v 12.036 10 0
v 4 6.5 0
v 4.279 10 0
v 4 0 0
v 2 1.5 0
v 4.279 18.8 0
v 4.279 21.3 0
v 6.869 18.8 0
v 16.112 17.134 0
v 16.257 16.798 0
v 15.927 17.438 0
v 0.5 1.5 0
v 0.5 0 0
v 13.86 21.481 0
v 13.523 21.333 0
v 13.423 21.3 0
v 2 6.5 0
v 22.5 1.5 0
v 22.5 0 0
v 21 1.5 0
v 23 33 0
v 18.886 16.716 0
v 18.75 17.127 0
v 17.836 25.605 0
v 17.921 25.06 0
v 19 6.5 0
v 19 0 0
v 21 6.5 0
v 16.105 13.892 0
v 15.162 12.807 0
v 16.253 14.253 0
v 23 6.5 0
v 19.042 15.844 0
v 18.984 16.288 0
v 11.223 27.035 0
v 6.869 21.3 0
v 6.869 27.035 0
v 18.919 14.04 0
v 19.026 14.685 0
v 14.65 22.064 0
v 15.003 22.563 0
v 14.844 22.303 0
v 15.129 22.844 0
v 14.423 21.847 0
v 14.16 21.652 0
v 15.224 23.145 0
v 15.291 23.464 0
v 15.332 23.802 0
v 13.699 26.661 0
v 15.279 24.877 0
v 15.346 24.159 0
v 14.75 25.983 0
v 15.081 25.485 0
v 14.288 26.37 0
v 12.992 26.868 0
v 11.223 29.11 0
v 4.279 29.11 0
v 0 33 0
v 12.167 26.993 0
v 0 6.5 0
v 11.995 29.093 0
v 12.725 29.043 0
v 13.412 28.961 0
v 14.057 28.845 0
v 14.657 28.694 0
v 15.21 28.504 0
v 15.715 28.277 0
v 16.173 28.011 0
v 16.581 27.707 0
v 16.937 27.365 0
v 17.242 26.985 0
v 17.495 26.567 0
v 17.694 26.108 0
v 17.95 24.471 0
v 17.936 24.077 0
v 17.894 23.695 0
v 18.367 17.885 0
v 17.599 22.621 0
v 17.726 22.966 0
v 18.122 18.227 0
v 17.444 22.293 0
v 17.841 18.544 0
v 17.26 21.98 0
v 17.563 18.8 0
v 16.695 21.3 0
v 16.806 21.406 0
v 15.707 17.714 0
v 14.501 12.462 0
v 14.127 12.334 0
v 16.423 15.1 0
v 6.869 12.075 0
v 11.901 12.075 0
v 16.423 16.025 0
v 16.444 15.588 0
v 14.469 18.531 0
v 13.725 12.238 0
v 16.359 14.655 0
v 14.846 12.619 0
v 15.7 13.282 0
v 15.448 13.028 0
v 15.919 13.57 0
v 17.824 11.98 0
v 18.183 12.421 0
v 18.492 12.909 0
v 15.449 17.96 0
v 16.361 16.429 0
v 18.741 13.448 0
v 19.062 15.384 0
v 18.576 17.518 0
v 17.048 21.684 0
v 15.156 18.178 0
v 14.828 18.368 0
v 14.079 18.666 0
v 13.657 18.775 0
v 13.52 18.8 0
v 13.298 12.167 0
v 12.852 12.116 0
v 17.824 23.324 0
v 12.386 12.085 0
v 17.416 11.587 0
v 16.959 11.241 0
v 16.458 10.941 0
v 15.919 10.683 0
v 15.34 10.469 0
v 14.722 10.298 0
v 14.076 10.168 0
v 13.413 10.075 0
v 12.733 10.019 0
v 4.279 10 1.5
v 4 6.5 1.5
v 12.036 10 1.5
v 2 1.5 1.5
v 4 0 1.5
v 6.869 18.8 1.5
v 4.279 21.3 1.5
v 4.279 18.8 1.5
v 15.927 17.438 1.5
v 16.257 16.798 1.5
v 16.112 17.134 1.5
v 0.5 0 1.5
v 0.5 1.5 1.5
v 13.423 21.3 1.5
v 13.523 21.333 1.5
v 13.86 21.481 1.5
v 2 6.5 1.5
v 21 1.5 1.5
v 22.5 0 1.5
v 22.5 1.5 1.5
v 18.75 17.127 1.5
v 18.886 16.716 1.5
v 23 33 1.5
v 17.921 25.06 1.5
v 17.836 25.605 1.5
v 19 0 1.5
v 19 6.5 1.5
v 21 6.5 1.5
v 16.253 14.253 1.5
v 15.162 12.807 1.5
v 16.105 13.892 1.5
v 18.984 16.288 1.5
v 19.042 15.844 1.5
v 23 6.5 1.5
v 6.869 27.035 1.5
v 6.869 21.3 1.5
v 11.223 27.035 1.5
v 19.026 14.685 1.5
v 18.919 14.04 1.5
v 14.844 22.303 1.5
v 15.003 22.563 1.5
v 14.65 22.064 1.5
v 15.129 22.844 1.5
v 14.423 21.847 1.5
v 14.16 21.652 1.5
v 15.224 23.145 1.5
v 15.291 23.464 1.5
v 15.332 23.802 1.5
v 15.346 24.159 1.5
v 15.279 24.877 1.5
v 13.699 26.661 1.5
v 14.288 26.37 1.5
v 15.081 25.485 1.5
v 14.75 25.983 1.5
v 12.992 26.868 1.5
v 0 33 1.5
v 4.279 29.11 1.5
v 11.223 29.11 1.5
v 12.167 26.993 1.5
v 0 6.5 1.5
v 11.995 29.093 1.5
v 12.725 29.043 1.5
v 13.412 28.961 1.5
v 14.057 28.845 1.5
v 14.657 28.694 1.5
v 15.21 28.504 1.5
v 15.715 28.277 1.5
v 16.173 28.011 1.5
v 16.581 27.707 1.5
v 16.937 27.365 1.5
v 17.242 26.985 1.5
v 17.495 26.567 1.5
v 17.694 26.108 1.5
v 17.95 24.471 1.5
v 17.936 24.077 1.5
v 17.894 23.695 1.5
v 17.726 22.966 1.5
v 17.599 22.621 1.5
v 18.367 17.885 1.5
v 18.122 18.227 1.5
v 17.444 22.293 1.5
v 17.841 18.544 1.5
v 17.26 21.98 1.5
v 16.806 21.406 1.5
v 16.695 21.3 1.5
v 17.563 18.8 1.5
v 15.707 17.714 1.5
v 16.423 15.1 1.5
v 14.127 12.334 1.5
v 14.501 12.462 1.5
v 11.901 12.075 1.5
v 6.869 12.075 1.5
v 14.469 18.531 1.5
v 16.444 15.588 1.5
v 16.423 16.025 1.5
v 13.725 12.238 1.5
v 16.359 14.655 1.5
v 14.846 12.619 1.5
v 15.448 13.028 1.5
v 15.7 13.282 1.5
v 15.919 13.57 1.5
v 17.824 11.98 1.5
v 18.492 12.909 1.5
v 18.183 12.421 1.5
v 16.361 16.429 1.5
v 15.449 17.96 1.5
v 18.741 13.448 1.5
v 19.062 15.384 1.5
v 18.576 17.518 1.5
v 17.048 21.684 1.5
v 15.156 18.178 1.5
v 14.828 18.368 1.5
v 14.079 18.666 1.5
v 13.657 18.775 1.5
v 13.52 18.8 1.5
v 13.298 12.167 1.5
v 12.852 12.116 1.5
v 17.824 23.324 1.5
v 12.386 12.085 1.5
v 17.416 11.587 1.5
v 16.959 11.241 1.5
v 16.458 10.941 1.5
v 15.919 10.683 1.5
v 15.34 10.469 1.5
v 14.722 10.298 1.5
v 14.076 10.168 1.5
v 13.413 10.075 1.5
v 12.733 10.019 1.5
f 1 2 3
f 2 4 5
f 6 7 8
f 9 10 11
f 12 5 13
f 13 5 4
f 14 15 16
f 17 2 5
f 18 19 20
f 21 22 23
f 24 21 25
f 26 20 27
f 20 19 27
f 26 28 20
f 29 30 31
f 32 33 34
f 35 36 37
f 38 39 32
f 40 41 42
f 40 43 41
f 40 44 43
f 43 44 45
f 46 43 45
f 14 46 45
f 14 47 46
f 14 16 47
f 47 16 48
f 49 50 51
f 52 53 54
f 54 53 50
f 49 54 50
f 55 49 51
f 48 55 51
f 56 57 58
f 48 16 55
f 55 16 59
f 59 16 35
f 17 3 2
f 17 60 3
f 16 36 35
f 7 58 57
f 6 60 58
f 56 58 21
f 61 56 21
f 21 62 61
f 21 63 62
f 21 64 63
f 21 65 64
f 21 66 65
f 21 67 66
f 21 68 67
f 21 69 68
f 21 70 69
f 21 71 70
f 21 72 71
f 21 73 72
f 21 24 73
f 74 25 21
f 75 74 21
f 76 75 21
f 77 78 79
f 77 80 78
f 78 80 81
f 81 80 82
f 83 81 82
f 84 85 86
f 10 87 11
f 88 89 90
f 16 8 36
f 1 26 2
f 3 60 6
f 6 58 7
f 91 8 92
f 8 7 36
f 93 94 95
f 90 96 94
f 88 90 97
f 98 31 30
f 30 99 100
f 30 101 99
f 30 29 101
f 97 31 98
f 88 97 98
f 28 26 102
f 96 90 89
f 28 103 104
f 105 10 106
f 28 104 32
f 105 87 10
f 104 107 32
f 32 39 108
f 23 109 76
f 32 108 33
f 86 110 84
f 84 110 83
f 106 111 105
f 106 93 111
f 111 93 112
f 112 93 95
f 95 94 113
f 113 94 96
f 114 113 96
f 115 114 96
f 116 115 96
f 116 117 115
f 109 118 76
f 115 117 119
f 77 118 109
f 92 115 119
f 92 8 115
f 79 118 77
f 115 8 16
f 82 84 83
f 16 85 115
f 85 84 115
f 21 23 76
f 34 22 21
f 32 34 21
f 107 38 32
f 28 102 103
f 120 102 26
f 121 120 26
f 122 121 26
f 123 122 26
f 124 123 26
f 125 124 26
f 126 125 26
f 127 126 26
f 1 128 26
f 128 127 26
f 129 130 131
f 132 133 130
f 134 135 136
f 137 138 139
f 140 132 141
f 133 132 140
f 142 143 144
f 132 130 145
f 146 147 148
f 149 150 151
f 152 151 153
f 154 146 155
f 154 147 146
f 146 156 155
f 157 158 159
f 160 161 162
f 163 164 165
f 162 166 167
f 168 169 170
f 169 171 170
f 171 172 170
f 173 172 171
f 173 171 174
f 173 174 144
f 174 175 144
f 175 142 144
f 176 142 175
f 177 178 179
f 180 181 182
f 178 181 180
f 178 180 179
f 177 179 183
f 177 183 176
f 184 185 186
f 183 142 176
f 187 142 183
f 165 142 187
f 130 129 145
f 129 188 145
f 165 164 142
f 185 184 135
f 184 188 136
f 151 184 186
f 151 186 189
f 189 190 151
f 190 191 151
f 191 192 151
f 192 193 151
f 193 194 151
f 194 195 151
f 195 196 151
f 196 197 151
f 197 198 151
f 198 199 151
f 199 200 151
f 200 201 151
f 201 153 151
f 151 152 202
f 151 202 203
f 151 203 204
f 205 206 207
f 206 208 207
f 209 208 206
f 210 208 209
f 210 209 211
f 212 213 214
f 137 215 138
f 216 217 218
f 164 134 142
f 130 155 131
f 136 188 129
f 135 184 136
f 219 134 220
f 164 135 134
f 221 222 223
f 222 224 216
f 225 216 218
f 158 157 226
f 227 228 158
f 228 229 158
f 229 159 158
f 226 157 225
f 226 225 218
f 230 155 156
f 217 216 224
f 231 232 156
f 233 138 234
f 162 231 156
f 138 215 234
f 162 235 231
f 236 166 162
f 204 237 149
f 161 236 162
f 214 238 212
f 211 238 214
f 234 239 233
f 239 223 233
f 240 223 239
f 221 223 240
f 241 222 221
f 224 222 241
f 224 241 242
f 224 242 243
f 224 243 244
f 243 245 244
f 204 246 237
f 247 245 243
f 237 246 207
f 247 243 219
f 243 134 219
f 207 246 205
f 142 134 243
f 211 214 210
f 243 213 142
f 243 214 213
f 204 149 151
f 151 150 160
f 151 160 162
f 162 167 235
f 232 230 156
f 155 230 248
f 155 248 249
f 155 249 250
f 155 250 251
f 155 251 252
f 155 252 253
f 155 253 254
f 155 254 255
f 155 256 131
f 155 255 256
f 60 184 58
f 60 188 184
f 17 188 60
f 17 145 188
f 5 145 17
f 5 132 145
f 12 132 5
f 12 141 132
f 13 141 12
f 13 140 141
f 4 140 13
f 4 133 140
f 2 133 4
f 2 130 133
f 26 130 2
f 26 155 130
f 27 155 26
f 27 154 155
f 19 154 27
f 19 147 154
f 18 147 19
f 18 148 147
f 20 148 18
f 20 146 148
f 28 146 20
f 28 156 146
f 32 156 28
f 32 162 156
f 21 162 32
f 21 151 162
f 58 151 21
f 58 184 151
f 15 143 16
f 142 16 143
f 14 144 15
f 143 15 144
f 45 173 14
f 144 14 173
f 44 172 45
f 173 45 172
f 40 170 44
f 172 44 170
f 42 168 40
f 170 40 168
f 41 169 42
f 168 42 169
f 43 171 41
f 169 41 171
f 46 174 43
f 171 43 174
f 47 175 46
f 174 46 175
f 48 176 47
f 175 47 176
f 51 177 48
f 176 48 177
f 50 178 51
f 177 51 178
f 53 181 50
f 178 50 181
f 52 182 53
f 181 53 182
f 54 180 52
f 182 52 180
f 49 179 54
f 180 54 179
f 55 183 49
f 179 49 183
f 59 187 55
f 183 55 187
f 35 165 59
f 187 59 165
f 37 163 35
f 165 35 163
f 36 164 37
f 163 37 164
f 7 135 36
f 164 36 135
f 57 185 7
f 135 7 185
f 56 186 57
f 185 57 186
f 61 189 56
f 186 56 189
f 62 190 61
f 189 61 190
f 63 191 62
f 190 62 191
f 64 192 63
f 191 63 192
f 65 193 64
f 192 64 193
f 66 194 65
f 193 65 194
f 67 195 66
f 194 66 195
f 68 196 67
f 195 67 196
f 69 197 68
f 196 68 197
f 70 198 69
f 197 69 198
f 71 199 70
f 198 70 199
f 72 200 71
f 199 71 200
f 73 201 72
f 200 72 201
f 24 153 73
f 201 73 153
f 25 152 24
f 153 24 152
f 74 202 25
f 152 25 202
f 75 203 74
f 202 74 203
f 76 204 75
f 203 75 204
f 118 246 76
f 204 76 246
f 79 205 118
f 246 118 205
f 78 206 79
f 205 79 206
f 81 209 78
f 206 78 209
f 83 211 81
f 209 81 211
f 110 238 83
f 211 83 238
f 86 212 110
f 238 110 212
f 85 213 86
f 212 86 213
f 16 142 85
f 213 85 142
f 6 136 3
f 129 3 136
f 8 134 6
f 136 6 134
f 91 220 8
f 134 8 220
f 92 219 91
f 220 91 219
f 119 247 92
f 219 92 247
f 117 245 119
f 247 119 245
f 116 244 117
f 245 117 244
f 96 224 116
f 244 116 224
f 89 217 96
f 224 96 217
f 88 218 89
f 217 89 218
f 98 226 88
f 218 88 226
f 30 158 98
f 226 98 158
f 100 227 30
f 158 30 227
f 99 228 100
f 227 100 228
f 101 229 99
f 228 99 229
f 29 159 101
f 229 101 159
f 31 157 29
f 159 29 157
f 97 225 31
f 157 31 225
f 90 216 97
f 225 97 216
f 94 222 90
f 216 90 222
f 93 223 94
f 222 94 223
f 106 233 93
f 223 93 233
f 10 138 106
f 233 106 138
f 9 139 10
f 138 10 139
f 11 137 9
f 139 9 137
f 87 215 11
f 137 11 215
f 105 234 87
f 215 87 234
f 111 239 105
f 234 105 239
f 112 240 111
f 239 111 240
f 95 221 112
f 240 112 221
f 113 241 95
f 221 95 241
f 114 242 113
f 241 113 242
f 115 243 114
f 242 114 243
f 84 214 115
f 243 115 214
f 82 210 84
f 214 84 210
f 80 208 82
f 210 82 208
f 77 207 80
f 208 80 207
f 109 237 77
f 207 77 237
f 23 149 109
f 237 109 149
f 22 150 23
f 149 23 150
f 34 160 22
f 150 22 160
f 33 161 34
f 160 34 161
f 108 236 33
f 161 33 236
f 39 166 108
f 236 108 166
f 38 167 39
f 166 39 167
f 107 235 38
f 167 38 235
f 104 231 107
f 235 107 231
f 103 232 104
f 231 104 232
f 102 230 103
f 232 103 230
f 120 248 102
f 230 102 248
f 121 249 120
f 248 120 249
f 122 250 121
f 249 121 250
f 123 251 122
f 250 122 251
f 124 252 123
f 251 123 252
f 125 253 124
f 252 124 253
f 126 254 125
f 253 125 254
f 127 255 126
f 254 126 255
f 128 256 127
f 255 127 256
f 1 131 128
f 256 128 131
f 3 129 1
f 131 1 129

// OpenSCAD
// file: _action_card_module.scad
module 2d_action_card(letter, letter_offset) {
    width=23;
    height=33;
    difference() {
            square([width, height]);
            translate([-1, 1.5, 0]) square([3, 5]);
            translate([-1, -1, 0]) square([1.5, 4]);
            translate([4, -1.5, 0]) square([width-8, 8]);
            translate([width-2, 1.5, 0]) square([3, 5]);
            translate([width-0.5, -1, 0]) square([2, 4]);
            translate([letter_offset, 10, 0]) text(letter, 20);
        }
}
// main file
include <_action_card_module.scad>;

linear_extrude(1.5) {
    union() {
        2d_action_card("B", 2);
        translate([0,18.8,0]) square([23,2.5]);
        //translate([7.5,10,0]) square([2,20]);
    }
}
